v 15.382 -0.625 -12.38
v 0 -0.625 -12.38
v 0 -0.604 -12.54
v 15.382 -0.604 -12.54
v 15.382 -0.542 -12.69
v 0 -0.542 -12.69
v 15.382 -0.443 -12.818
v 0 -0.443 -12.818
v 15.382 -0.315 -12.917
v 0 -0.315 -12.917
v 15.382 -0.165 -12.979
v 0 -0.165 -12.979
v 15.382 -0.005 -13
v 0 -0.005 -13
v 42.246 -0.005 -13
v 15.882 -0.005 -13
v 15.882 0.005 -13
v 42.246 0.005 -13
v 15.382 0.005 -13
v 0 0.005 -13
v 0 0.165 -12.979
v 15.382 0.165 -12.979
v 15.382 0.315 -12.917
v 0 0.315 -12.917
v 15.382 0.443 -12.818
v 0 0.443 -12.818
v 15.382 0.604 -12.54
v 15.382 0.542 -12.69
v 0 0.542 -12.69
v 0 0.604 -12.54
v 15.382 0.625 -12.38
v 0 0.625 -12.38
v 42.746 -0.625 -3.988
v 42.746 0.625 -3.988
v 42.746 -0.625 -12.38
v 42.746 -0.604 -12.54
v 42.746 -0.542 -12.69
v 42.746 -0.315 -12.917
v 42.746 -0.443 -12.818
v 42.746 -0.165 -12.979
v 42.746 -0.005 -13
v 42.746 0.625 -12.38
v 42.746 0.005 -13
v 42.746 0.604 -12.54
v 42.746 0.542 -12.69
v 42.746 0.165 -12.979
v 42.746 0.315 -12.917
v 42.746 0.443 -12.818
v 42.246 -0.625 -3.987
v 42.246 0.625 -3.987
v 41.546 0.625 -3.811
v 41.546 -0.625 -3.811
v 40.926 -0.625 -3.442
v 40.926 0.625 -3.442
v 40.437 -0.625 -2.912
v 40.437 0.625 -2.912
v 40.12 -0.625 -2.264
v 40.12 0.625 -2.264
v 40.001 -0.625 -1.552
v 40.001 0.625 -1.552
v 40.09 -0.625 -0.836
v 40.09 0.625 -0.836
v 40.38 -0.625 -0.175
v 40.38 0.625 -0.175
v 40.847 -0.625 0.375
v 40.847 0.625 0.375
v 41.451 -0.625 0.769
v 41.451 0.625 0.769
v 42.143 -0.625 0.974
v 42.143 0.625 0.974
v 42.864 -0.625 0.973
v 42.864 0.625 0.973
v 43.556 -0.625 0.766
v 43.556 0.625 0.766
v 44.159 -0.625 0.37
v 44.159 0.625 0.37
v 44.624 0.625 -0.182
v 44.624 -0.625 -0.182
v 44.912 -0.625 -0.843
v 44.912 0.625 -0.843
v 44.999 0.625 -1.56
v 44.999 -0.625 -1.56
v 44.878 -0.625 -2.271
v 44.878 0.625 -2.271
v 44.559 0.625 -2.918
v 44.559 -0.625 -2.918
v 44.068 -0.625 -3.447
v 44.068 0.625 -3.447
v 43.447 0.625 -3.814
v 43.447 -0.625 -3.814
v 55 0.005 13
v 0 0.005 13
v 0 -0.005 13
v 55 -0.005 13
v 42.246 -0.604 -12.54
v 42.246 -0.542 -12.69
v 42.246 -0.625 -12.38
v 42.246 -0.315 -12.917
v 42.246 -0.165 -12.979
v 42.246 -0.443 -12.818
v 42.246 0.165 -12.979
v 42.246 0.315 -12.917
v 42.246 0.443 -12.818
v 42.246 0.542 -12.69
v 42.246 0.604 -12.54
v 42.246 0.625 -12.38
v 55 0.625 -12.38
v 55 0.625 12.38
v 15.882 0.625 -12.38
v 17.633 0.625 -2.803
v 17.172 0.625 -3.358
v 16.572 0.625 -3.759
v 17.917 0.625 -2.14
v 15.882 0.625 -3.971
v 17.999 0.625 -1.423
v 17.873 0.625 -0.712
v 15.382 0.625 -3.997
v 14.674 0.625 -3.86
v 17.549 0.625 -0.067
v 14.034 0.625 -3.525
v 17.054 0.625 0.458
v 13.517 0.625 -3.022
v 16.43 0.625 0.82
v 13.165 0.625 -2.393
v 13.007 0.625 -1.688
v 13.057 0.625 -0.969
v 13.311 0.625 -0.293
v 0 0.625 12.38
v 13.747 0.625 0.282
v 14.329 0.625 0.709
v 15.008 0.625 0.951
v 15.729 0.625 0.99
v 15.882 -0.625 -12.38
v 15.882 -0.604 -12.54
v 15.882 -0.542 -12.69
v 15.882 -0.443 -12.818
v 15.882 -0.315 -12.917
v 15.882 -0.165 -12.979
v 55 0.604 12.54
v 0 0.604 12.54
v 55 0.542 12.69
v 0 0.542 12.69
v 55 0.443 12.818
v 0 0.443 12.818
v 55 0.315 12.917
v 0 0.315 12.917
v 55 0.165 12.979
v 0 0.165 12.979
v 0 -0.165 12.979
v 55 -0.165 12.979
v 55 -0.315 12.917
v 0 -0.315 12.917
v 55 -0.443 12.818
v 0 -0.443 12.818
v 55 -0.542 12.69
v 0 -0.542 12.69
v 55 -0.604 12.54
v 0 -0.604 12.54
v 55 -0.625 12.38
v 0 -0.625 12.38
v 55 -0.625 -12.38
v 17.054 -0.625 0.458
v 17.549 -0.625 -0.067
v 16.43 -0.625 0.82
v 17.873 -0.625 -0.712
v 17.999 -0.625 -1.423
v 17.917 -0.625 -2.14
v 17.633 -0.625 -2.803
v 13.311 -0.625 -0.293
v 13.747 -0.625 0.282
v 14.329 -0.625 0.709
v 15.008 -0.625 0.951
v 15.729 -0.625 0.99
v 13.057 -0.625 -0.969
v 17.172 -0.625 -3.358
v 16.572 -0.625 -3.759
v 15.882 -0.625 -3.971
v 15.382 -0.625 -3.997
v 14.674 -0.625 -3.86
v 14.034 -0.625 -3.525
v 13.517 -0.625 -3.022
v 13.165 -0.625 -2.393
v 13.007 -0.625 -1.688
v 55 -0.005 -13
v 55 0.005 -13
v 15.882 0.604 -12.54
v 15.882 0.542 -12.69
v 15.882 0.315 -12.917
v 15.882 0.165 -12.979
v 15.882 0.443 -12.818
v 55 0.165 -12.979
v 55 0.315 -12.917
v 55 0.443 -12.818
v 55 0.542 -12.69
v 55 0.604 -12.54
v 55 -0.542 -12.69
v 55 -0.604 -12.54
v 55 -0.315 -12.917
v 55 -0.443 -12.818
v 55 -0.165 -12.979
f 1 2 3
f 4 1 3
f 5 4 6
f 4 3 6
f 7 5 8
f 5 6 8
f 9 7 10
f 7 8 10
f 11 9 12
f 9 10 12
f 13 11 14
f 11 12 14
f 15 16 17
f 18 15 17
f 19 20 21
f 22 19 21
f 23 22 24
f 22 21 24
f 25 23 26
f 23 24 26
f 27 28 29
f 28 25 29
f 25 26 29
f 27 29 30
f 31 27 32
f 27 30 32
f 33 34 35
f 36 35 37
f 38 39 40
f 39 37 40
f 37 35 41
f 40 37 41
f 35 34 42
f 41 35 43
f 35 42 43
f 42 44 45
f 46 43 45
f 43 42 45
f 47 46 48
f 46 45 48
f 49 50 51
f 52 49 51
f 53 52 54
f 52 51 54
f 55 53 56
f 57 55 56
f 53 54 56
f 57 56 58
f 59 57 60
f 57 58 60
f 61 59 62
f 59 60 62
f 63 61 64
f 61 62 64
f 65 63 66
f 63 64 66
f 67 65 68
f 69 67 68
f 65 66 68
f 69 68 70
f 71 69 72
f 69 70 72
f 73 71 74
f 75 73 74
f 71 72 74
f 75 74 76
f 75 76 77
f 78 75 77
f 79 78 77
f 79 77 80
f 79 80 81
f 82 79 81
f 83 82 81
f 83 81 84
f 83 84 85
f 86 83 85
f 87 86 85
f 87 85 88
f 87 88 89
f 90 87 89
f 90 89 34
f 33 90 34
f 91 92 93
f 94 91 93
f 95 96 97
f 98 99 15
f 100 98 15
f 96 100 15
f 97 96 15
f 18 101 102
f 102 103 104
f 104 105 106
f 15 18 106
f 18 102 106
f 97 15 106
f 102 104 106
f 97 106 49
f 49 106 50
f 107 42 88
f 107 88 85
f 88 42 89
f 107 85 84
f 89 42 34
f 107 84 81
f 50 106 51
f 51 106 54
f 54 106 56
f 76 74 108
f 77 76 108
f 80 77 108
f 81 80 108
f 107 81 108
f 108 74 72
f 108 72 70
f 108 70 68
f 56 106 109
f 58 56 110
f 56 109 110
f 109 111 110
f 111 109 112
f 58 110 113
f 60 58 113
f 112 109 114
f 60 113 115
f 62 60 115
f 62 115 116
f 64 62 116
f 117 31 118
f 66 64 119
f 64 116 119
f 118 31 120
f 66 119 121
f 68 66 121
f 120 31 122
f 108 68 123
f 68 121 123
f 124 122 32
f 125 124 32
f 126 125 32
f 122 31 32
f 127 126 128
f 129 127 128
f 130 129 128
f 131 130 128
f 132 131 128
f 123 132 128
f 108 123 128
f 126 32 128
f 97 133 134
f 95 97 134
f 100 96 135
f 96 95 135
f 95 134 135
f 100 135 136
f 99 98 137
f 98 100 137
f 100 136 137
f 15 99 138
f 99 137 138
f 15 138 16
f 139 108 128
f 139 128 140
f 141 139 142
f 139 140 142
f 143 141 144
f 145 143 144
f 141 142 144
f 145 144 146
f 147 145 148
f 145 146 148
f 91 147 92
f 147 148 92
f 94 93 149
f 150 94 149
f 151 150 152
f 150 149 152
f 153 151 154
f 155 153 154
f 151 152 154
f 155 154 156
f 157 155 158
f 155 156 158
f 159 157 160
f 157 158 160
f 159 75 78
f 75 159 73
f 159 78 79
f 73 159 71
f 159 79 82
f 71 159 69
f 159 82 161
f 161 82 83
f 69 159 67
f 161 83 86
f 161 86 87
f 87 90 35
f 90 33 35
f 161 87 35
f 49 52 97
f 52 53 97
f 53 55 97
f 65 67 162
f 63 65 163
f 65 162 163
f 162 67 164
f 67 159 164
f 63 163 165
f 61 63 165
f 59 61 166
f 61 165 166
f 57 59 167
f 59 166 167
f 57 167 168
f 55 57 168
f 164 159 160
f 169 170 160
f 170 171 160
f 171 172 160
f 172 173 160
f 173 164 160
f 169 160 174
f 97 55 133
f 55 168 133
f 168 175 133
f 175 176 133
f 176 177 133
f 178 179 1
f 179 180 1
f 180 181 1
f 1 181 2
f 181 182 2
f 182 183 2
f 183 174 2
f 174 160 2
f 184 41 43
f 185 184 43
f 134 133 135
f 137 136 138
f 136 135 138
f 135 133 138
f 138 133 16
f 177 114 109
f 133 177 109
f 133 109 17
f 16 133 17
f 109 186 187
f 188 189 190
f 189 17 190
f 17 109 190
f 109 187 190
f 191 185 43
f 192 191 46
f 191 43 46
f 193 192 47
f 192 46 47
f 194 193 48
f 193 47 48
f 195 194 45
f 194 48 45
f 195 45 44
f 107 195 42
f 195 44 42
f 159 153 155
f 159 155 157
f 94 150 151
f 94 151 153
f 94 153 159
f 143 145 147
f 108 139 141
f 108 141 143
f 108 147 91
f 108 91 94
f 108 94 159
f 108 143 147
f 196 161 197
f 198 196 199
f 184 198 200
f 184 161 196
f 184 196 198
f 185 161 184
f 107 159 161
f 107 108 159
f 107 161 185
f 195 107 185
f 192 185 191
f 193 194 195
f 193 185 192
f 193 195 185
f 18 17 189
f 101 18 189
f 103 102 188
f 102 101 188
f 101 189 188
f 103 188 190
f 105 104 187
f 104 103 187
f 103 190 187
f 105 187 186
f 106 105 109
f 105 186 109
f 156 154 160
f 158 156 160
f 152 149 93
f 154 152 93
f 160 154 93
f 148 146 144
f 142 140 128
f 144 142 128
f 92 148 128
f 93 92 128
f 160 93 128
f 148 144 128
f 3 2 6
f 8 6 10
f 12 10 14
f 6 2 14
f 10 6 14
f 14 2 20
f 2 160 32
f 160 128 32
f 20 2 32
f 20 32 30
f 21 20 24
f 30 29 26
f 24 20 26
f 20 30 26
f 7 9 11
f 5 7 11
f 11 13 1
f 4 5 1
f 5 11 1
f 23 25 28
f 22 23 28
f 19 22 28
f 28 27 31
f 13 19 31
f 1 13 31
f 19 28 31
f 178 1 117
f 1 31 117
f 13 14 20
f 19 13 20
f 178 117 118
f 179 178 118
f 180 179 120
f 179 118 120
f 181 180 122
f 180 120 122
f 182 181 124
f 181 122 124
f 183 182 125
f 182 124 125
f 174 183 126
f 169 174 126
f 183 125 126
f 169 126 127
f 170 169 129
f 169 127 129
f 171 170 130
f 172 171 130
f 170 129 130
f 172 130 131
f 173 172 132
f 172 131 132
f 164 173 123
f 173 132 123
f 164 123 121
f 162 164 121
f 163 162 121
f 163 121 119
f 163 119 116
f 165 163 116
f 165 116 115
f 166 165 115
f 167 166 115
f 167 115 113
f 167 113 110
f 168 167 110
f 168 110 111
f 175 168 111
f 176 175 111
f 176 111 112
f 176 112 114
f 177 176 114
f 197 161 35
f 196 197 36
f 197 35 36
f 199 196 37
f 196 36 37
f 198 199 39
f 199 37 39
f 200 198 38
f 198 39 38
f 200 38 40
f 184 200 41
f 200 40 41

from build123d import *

# Parameters (mm, degrees)
BOSS_EXTRUDE1_DEPTH = 55
SKETCH2_W           = 0.5
SKETCH2_H           = 4.754059282
SKETCH2_H_2         = 4.044844813
CUT_EXTRUDE1_DEPTH  = 2.25


with BuildPart() as part:
    # Sketch1 → Boss-Extrude1 (new body)
    with BuildSketch(Plane(origin=(0, 0, 0), x_dir=(0, 0, -1), z_dir=(1, 0, 0))):
        with BuildLine():
            Line((12.38, 0.625), (-12.38, 0.625))
            ThreePointArc((-12.38, 0.625), (-12.818406204, 0.443406204), (-13, 0.005))
            Line((-13, 0.005), (-13, -0.005))
            ThreePointArc((-13, -0.005), (-12.818406204, -0.443406204), (-12.38, -0.625))
            Line((-12.38, -0.625), (12.38, -0.625))
            ThreePointArc((12.38, -0.625), (12.818406204, -0.443406204), (13, -0.005))
            Line((13, -0.005), (13, 0.005))
            ThreePointArc((13, 0.005), (12.818406204, 0.443406204), (12.38, 0.625))
        make_face()
    extrude(amount=BOSS_EXTRUDE1_DEPTH)

    # Sketch2 → Cut-Extrude1 (cut, through all)
    with BuildSketch(Plane(origin=(0, 0.625, 0), x_dir=(1, 0, 0), z_dir=(0, 1, 0))):
        with BuildLine():
            ThreePointArc((15.382256297, 3.997225745), (15.367075517, -0.996463715), (15.882256297, 3.97060319))
            Line((15.882256297, 3.97060319), (15.882256297, 12.38))
            Line((15.882256297, 12.38), (15.382256297, 12.38))
            Line((15.382256297, 12.38), (15.382256297, 3.997225745))
        make_face()
        with BuildLine():
            Line((42.746308765, 12.38), (42.246308765, 12.38))
            Line((42.246308765, 12.38), (42.246308765, 3.987094843))
            ThreePointArc((42.246308765, 3.987094843), (42.50370983, -0.999997247), (42.746308765, 3.98783681))
            Line((42.746308765, 3.98783681), (42.746308765, 12.38))
        make_face()
        with Locations((15.632256297, 14.757029641)):
            Rectangle(SKETCH2_W, SKETCH2_H)
        with Locations((42.496308765, 14.402422407)):
            Rectangle(SKETCH2_W, SKETCH2_H_2)
    extrude(amount=-CUT_EXTRUDE1_DEPTH, mode=Mode.SUBTRACT)


solid = part.part
